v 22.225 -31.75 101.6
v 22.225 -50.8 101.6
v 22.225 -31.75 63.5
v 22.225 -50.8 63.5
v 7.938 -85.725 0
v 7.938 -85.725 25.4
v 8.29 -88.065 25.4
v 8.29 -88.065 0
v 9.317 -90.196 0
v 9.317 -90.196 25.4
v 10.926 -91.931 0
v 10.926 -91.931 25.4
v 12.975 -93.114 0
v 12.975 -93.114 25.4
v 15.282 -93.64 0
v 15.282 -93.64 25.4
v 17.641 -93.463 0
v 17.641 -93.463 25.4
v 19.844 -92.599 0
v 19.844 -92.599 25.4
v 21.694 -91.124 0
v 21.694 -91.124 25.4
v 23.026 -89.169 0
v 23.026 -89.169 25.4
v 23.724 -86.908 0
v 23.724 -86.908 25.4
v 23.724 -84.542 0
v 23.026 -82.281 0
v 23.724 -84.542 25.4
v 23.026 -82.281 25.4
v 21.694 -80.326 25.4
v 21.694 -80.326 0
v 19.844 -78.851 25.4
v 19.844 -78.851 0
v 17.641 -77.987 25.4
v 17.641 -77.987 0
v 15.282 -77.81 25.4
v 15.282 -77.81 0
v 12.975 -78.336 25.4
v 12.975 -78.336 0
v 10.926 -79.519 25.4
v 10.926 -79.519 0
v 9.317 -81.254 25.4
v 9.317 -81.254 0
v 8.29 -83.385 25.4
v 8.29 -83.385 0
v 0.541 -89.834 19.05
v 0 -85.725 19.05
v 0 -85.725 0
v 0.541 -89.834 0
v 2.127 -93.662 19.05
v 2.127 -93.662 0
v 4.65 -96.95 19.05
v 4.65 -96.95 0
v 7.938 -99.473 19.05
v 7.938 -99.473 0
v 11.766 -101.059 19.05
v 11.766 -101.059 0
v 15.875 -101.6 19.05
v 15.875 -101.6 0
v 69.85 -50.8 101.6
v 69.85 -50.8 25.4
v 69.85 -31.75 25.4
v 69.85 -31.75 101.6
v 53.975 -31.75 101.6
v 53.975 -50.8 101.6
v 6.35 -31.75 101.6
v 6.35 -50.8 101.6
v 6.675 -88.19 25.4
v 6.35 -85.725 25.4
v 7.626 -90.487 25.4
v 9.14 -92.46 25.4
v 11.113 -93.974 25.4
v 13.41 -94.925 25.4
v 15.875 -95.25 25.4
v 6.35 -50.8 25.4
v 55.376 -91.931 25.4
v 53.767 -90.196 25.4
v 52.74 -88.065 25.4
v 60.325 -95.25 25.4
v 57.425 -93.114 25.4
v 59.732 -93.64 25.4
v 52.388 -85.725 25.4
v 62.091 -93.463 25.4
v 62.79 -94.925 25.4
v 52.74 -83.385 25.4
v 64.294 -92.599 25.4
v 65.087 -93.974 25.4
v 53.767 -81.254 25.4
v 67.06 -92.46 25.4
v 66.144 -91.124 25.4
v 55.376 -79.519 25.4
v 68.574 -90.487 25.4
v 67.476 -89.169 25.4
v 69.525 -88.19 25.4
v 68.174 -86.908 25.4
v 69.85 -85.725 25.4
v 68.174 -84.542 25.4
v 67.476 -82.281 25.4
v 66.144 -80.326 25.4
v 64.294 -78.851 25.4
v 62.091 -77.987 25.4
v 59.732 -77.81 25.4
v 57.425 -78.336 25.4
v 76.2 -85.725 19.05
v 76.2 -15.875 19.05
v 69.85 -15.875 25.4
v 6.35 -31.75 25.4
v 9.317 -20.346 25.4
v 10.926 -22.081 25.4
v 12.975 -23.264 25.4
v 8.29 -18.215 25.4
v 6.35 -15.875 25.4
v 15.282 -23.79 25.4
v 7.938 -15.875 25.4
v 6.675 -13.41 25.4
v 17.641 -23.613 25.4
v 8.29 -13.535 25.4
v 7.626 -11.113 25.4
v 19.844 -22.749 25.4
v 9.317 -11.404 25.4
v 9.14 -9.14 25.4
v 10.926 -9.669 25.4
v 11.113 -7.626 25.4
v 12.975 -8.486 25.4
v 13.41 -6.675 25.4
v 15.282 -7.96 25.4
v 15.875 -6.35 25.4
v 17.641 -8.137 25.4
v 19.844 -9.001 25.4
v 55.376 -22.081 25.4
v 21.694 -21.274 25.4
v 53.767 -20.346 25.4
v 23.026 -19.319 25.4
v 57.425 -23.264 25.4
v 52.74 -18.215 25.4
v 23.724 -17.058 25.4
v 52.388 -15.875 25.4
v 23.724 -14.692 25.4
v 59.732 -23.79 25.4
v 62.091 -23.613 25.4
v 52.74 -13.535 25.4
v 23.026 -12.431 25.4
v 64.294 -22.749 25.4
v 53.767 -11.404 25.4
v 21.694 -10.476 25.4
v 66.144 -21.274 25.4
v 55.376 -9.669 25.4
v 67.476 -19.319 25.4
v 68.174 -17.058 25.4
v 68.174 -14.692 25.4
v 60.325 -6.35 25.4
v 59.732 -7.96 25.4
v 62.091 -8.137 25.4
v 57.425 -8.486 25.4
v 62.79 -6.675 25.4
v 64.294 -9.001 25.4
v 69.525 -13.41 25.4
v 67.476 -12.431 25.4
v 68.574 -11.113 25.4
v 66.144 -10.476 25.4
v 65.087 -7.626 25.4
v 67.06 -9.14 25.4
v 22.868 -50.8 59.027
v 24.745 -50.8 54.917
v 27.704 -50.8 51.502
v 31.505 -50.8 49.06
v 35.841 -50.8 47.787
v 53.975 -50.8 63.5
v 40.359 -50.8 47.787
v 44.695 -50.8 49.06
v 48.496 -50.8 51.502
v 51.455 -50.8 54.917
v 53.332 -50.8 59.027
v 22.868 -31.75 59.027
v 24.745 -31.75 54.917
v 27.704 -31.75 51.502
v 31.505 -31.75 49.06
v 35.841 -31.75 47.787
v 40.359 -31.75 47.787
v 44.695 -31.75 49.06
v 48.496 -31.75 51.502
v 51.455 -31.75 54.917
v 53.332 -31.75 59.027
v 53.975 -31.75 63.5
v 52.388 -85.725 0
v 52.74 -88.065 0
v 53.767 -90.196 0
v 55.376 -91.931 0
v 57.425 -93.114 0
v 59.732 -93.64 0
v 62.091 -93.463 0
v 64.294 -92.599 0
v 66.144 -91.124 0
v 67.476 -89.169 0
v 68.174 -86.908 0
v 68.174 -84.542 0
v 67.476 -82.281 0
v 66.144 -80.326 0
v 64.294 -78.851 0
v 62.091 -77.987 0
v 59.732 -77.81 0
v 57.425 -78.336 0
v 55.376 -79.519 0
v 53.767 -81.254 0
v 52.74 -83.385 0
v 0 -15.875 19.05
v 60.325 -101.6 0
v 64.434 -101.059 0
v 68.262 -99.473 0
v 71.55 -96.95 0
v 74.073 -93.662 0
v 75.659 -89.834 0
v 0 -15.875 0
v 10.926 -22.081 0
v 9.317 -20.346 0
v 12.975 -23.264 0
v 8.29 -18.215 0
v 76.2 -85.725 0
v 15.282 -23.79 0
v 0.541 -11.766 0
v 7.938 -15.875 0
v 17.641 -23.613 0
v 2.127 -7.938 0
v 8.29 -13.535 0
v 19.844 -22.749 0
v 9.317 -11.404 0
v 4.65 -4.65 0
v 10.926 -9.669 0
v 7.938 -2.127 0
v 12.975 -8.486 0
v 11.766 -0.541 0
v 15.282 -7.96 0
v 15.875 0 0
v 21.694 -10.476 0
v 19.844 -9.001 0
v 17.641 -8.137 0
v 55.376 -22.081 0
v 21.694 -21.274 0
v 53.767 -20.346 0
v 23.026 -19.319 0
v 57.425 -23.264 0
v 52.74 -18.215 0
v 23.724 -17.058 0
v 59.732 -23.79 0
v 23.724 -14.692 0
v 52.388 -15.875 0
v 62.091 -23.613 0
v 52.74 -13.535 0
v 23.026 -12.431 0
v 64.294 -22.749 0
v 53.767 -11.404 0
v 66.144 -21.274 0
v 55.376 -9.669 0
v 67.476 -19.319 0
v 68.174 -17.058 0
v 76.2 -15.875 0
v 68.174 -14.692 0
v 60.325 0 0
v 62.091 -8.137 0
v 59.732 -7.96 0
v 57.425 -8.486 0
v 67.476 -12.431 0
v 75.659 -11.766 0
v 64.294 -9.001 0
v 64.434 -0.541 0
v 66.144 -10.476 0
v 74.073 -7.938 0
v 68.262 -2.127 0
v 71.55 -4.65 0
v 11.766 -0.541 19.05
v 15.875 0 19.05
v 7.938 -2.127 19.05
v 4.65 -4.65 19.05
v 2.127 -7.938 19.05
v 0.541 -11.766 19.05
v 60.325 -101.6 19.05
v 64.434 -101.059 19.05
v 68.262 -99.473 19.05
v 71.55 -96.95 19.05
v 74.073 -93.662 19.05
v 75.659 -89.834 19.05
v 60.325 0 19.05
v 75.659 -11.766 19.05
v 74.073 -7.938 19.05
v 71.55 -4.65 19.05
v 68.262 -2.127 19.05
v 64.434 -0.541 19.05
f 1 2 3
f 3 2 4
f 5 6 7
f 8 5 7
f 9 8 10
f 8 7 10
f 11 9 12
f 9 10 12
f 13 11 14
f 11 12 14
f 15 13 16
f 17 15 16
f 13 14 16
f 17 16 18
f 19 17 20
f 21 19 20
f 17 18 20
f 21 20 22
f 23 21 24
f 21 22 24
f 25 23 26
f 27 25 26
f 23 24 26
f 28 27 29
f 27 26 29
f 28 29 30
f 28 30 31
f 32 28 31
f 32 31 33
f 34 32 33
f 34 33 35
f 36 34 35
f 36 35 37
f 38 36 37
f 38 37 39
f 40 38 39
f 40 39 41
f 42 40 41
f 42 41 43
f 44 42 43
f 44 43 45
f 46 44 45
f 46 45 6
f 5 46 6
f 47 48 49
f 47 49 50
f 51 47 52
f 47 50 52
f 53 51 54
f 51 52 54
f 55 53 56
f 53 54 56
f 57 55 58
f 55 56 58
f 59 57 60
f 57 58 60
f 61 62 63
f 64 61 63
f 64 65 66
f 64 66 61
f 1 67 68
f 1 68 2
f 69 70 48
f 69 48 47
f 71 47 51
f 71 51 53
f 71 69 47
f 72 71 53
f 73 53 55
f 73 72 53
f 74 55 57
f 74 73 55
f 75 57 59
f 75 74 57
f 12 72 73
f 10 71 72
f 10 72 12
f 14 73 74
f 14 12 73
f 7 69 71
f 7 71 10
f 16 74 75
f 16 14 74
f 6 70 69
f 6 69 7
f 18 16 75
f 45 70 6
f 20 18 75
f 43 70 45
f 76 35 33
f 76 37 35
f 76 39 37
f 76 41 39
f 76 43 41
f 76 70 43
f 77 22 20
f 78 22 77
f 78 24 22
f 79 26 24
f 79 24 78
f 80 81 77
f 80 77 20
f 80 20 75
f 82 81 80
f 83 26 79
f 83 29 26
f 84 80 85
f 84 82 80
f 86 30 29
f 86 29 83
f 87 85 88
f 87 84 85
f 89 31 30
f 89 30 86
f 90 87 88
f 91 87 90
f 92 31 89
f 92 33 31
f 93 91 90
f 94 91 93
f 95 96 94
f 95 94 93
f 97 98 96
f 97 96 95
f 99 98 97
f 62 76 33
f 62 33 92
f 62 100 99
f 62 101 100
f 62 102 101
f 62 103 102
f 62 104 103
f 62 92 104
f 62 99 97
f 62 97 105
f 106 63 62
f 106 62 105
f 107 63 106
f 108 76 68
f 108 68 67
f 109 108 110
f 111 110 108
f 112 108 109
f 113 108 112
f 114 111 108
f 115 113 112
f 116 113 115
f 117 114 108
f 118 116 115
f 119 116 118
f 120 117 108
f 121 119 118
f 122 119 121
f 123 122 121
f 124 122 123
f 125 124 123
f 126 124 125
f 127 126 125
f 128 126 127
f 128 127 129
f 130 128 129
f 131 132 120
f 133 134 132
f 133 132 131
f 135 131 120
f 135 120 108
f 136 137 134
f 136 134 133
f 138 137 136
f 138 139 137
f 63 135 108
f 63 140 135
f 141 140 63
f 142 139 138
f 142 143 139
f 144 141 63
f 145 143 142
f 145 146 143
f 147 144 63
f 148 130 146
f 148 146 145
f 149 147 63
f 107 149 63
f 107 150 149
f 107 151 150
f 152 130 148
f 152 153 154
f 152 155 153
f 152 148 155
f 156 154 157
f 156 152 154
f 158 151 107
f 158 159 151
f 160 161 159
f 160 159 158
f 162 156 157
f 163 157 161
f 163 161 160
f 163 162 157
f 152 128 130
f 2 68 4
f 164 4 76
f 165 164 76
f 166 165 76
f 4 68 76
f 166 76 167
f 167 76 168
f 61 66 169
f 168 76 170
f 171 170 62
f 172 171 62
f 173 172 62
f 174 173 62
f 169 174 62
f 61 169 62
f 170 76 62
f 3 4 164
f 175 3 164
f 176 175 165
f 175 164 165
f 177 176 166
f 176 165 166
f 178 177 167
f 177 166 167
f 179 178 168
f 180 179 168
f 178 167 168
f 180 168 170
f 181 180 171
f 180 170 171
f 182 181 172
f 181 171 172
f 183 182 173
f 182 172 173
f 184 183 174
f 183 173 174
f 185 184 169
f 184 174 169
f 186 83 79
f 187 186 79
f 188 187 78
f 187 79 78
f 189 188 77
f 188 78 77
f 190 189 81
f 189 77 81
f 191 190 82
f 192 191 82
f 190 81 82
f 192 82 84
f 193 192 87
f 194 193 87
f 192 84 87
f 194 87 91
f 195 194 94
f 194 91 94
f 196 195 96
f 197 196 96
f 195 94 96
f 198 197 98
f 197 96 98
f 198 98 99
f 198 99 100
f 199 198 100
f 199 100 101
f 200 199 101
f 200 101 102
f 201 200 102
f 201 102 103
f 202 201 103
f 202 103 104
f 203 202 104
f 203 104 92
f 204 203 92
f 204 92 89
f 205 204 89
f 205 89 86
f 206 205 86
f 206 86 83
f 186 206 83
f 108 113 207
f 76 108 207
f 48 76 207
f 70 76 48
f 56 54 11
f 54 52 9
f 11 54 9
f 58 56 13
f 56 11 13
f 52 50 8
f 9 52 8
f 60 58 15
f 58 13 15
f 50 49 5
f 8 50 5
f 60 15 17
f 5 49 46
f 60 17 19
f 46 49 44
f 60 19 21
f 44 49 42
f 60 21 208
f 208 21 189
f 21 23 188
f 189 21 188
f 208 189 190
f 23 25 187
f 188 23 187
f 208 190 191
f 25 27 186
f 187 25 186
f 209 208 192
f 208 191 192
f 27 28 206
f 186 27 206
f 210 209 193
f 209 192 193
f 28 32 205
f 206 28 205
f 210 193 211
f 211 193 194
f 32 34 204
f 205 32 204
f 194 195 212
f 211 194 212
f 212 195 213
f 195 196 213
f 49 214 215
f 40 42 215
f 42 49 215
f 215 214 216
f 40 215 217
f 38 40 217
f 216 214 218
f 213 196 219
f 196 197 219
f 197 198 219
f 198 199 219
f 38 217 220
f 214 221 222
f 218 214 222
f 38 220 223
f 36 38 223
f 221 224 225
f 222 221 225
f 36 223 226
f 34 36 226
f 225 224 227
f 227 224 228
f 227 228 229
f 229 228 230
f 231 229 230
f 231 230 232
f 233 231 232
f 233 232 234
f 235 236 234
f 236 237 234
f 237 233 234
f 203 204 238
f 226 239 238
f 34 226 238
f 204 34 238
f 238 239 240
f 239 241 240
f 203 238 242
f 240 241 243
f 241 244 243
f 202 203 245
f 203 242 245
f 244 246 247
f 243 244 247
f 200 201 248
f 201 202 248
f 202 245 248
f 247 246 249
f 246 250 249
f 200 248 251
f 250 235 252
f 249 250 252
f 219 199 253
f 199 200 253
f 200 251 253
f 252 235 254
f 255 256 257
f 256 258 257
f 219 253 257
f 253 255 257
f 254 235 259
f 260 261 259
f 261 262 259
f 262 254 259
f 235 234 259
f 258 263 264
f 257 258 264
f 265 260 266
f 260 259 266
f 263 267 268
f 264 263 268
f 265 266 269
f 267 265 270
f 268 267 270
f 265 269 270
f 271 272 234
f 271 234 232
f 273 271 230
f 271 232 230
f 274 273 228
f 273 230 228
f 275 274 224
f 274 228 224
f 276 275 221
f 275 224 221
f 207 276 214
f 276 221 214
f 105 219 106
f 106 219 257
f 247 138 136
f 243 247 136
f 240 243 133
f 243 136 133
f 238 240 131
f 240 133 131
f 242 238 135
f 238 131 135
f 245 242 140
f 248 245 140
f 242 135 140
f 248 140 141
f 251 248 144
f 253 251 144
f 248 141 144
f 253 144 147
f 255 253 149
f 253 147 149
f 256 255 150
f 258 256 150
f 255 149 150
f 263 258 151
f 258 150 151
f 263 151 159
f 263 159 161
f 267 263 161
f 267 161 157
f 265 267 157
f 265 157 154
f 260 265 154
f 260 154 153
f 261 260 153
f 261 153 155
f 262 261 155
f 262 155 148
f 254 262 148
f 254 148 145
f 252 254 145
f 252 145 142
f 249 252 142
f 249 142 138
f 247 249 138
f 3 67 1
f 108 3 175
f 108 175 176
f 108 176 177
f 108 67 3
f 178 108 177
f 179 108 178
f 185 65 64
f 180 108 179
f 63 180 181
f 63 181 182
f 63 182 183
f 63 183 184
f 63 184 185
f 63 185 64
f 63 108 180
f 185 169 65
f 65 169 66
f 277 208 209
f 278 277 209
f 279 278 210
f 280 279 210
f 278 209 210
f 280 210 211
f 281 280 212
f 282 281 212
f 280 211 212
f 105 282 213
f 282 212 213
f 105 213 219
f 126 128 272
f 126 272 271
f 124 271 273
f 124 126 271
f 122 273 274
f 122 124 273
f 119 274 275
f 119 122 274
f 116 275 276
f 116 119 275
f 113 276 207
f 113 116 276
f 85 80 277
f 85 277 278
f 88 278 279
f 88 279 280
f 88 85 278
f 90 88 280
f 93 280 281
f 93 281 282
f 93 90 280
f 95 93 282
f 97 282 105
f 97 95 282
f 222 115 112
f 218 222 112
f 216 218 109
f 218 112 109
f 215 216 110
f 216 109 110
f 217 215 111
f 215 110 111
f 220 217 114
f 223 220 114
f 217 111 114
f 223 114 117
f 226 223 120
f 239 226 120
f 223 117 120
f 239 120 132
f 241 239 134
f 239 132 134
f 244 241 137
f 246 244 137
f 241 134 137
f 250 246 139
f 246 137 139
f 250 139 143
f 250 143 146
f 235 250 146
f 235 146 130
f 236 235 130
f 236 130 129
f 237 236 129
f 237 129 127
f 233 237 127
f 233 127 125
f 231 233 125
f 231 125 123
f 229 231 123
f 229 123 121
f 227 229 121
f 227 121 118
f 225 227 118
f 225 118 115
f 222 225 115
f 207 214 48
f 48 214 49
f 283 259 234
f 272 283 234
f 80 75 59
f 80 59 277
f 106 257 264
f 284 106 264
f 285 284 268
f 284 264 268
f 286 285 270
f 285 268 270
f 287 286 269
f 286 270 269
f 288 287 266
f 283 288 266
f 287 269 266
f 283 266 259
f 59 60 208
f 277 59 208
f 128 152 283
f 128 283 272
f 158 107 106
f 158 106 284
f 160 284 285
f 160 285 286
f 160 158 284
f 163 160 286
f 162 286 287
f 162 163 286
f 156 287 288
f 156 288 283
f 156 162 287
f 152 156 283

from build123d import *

# Parameters (mm, degrees)
F1_DEPTH = 25.4
F2_D     = 15.875
F3_SIZE  = 6.35
F4_W     = 63.5
F4_H     = 19.05
F5_DEPTH = 76.2
F7_DEPTH = 25.4


with BuildPart() as f1:
    # F0 (on Top) → F1 (new body)
    with BuildSketch(Plane.XY):
        with BuildLine():
            Line((60.325, 0), (15.875, 0))
            ThreePointArc((15.875, 0), (4.6496798487, -4.6496798487), (0, -15.875))
            Line((0, -15.875), (0, -85.725))
            ThreePointArc((0, -85.725), (4.6496798487, -96.9503201513), (15.875, -101.6))
            Line((15.875, -101.6), (60.325, -101.6))
            ThreePointArc((60.325, -101.6), (71.5503201513, -96.9503201513), (76.2, -85.725))
            Line((76.2, -85.725), (76.2, -15.875))
            ThreePointArc((76.2, -15.875), (71.5503201513, -4.6496798487), (60.325, 0))
        make_face()
    extrude(amount=F1_DEPTH)

    # F2 (through all)
    with Locations(Plane(origin=(0, 0, 0), x_dir=(1, 0, 0), z_dir=(0, 0, -1))):
        with Locations((15.875, 15.875), (60.325, 15.875), (60.325, 85.725), (15.875, 85.725)):
            Hole(F2_D / 2)

    # F3
    f3_edges = [f1.edges().sort_by_distance(p)[0] for p in [
        (4.64968, -4.64968, 25.4),
    ]]
    chamfer(f3_edges, length=F3_SIZE)

    # F4 (on face) → F5 (join)
    with BuildSketch(Plane.XY.offset(25.4)):
        with Locations((38.1, -41.275)):
            Rectangle(F4_W, F4_H)
    extrude(amount=F5_DEPTH)

    # F6 (on face) → F7 (cut)
    with BuildSketch(Plane.XZ.offset(50.8)):
        with BuildLine():
            Line((53.975, 63.5), (53.975, 101.6))
            Line((53.975, 101.6), (22.225, 101.6))
            Line((22.225, 101.6), (22.225, 63.5))
            ThreePointArc((22.225, 63.5), (38.1, 79.375), (53.975, 63.5))
        make_face()
        with BuildLine():
            ThreePointArc((22.225, 63.5), (38.1, 47.625), (53.975, 63.5))
            ThreePointArc((53.975, 63.5), (38.1, 79.375), (22.225, 63.5))
        make_face()
    extrude(amount=-F7_DEPTH, mode=Mode.SUBTRACT)


solid = f1.part
